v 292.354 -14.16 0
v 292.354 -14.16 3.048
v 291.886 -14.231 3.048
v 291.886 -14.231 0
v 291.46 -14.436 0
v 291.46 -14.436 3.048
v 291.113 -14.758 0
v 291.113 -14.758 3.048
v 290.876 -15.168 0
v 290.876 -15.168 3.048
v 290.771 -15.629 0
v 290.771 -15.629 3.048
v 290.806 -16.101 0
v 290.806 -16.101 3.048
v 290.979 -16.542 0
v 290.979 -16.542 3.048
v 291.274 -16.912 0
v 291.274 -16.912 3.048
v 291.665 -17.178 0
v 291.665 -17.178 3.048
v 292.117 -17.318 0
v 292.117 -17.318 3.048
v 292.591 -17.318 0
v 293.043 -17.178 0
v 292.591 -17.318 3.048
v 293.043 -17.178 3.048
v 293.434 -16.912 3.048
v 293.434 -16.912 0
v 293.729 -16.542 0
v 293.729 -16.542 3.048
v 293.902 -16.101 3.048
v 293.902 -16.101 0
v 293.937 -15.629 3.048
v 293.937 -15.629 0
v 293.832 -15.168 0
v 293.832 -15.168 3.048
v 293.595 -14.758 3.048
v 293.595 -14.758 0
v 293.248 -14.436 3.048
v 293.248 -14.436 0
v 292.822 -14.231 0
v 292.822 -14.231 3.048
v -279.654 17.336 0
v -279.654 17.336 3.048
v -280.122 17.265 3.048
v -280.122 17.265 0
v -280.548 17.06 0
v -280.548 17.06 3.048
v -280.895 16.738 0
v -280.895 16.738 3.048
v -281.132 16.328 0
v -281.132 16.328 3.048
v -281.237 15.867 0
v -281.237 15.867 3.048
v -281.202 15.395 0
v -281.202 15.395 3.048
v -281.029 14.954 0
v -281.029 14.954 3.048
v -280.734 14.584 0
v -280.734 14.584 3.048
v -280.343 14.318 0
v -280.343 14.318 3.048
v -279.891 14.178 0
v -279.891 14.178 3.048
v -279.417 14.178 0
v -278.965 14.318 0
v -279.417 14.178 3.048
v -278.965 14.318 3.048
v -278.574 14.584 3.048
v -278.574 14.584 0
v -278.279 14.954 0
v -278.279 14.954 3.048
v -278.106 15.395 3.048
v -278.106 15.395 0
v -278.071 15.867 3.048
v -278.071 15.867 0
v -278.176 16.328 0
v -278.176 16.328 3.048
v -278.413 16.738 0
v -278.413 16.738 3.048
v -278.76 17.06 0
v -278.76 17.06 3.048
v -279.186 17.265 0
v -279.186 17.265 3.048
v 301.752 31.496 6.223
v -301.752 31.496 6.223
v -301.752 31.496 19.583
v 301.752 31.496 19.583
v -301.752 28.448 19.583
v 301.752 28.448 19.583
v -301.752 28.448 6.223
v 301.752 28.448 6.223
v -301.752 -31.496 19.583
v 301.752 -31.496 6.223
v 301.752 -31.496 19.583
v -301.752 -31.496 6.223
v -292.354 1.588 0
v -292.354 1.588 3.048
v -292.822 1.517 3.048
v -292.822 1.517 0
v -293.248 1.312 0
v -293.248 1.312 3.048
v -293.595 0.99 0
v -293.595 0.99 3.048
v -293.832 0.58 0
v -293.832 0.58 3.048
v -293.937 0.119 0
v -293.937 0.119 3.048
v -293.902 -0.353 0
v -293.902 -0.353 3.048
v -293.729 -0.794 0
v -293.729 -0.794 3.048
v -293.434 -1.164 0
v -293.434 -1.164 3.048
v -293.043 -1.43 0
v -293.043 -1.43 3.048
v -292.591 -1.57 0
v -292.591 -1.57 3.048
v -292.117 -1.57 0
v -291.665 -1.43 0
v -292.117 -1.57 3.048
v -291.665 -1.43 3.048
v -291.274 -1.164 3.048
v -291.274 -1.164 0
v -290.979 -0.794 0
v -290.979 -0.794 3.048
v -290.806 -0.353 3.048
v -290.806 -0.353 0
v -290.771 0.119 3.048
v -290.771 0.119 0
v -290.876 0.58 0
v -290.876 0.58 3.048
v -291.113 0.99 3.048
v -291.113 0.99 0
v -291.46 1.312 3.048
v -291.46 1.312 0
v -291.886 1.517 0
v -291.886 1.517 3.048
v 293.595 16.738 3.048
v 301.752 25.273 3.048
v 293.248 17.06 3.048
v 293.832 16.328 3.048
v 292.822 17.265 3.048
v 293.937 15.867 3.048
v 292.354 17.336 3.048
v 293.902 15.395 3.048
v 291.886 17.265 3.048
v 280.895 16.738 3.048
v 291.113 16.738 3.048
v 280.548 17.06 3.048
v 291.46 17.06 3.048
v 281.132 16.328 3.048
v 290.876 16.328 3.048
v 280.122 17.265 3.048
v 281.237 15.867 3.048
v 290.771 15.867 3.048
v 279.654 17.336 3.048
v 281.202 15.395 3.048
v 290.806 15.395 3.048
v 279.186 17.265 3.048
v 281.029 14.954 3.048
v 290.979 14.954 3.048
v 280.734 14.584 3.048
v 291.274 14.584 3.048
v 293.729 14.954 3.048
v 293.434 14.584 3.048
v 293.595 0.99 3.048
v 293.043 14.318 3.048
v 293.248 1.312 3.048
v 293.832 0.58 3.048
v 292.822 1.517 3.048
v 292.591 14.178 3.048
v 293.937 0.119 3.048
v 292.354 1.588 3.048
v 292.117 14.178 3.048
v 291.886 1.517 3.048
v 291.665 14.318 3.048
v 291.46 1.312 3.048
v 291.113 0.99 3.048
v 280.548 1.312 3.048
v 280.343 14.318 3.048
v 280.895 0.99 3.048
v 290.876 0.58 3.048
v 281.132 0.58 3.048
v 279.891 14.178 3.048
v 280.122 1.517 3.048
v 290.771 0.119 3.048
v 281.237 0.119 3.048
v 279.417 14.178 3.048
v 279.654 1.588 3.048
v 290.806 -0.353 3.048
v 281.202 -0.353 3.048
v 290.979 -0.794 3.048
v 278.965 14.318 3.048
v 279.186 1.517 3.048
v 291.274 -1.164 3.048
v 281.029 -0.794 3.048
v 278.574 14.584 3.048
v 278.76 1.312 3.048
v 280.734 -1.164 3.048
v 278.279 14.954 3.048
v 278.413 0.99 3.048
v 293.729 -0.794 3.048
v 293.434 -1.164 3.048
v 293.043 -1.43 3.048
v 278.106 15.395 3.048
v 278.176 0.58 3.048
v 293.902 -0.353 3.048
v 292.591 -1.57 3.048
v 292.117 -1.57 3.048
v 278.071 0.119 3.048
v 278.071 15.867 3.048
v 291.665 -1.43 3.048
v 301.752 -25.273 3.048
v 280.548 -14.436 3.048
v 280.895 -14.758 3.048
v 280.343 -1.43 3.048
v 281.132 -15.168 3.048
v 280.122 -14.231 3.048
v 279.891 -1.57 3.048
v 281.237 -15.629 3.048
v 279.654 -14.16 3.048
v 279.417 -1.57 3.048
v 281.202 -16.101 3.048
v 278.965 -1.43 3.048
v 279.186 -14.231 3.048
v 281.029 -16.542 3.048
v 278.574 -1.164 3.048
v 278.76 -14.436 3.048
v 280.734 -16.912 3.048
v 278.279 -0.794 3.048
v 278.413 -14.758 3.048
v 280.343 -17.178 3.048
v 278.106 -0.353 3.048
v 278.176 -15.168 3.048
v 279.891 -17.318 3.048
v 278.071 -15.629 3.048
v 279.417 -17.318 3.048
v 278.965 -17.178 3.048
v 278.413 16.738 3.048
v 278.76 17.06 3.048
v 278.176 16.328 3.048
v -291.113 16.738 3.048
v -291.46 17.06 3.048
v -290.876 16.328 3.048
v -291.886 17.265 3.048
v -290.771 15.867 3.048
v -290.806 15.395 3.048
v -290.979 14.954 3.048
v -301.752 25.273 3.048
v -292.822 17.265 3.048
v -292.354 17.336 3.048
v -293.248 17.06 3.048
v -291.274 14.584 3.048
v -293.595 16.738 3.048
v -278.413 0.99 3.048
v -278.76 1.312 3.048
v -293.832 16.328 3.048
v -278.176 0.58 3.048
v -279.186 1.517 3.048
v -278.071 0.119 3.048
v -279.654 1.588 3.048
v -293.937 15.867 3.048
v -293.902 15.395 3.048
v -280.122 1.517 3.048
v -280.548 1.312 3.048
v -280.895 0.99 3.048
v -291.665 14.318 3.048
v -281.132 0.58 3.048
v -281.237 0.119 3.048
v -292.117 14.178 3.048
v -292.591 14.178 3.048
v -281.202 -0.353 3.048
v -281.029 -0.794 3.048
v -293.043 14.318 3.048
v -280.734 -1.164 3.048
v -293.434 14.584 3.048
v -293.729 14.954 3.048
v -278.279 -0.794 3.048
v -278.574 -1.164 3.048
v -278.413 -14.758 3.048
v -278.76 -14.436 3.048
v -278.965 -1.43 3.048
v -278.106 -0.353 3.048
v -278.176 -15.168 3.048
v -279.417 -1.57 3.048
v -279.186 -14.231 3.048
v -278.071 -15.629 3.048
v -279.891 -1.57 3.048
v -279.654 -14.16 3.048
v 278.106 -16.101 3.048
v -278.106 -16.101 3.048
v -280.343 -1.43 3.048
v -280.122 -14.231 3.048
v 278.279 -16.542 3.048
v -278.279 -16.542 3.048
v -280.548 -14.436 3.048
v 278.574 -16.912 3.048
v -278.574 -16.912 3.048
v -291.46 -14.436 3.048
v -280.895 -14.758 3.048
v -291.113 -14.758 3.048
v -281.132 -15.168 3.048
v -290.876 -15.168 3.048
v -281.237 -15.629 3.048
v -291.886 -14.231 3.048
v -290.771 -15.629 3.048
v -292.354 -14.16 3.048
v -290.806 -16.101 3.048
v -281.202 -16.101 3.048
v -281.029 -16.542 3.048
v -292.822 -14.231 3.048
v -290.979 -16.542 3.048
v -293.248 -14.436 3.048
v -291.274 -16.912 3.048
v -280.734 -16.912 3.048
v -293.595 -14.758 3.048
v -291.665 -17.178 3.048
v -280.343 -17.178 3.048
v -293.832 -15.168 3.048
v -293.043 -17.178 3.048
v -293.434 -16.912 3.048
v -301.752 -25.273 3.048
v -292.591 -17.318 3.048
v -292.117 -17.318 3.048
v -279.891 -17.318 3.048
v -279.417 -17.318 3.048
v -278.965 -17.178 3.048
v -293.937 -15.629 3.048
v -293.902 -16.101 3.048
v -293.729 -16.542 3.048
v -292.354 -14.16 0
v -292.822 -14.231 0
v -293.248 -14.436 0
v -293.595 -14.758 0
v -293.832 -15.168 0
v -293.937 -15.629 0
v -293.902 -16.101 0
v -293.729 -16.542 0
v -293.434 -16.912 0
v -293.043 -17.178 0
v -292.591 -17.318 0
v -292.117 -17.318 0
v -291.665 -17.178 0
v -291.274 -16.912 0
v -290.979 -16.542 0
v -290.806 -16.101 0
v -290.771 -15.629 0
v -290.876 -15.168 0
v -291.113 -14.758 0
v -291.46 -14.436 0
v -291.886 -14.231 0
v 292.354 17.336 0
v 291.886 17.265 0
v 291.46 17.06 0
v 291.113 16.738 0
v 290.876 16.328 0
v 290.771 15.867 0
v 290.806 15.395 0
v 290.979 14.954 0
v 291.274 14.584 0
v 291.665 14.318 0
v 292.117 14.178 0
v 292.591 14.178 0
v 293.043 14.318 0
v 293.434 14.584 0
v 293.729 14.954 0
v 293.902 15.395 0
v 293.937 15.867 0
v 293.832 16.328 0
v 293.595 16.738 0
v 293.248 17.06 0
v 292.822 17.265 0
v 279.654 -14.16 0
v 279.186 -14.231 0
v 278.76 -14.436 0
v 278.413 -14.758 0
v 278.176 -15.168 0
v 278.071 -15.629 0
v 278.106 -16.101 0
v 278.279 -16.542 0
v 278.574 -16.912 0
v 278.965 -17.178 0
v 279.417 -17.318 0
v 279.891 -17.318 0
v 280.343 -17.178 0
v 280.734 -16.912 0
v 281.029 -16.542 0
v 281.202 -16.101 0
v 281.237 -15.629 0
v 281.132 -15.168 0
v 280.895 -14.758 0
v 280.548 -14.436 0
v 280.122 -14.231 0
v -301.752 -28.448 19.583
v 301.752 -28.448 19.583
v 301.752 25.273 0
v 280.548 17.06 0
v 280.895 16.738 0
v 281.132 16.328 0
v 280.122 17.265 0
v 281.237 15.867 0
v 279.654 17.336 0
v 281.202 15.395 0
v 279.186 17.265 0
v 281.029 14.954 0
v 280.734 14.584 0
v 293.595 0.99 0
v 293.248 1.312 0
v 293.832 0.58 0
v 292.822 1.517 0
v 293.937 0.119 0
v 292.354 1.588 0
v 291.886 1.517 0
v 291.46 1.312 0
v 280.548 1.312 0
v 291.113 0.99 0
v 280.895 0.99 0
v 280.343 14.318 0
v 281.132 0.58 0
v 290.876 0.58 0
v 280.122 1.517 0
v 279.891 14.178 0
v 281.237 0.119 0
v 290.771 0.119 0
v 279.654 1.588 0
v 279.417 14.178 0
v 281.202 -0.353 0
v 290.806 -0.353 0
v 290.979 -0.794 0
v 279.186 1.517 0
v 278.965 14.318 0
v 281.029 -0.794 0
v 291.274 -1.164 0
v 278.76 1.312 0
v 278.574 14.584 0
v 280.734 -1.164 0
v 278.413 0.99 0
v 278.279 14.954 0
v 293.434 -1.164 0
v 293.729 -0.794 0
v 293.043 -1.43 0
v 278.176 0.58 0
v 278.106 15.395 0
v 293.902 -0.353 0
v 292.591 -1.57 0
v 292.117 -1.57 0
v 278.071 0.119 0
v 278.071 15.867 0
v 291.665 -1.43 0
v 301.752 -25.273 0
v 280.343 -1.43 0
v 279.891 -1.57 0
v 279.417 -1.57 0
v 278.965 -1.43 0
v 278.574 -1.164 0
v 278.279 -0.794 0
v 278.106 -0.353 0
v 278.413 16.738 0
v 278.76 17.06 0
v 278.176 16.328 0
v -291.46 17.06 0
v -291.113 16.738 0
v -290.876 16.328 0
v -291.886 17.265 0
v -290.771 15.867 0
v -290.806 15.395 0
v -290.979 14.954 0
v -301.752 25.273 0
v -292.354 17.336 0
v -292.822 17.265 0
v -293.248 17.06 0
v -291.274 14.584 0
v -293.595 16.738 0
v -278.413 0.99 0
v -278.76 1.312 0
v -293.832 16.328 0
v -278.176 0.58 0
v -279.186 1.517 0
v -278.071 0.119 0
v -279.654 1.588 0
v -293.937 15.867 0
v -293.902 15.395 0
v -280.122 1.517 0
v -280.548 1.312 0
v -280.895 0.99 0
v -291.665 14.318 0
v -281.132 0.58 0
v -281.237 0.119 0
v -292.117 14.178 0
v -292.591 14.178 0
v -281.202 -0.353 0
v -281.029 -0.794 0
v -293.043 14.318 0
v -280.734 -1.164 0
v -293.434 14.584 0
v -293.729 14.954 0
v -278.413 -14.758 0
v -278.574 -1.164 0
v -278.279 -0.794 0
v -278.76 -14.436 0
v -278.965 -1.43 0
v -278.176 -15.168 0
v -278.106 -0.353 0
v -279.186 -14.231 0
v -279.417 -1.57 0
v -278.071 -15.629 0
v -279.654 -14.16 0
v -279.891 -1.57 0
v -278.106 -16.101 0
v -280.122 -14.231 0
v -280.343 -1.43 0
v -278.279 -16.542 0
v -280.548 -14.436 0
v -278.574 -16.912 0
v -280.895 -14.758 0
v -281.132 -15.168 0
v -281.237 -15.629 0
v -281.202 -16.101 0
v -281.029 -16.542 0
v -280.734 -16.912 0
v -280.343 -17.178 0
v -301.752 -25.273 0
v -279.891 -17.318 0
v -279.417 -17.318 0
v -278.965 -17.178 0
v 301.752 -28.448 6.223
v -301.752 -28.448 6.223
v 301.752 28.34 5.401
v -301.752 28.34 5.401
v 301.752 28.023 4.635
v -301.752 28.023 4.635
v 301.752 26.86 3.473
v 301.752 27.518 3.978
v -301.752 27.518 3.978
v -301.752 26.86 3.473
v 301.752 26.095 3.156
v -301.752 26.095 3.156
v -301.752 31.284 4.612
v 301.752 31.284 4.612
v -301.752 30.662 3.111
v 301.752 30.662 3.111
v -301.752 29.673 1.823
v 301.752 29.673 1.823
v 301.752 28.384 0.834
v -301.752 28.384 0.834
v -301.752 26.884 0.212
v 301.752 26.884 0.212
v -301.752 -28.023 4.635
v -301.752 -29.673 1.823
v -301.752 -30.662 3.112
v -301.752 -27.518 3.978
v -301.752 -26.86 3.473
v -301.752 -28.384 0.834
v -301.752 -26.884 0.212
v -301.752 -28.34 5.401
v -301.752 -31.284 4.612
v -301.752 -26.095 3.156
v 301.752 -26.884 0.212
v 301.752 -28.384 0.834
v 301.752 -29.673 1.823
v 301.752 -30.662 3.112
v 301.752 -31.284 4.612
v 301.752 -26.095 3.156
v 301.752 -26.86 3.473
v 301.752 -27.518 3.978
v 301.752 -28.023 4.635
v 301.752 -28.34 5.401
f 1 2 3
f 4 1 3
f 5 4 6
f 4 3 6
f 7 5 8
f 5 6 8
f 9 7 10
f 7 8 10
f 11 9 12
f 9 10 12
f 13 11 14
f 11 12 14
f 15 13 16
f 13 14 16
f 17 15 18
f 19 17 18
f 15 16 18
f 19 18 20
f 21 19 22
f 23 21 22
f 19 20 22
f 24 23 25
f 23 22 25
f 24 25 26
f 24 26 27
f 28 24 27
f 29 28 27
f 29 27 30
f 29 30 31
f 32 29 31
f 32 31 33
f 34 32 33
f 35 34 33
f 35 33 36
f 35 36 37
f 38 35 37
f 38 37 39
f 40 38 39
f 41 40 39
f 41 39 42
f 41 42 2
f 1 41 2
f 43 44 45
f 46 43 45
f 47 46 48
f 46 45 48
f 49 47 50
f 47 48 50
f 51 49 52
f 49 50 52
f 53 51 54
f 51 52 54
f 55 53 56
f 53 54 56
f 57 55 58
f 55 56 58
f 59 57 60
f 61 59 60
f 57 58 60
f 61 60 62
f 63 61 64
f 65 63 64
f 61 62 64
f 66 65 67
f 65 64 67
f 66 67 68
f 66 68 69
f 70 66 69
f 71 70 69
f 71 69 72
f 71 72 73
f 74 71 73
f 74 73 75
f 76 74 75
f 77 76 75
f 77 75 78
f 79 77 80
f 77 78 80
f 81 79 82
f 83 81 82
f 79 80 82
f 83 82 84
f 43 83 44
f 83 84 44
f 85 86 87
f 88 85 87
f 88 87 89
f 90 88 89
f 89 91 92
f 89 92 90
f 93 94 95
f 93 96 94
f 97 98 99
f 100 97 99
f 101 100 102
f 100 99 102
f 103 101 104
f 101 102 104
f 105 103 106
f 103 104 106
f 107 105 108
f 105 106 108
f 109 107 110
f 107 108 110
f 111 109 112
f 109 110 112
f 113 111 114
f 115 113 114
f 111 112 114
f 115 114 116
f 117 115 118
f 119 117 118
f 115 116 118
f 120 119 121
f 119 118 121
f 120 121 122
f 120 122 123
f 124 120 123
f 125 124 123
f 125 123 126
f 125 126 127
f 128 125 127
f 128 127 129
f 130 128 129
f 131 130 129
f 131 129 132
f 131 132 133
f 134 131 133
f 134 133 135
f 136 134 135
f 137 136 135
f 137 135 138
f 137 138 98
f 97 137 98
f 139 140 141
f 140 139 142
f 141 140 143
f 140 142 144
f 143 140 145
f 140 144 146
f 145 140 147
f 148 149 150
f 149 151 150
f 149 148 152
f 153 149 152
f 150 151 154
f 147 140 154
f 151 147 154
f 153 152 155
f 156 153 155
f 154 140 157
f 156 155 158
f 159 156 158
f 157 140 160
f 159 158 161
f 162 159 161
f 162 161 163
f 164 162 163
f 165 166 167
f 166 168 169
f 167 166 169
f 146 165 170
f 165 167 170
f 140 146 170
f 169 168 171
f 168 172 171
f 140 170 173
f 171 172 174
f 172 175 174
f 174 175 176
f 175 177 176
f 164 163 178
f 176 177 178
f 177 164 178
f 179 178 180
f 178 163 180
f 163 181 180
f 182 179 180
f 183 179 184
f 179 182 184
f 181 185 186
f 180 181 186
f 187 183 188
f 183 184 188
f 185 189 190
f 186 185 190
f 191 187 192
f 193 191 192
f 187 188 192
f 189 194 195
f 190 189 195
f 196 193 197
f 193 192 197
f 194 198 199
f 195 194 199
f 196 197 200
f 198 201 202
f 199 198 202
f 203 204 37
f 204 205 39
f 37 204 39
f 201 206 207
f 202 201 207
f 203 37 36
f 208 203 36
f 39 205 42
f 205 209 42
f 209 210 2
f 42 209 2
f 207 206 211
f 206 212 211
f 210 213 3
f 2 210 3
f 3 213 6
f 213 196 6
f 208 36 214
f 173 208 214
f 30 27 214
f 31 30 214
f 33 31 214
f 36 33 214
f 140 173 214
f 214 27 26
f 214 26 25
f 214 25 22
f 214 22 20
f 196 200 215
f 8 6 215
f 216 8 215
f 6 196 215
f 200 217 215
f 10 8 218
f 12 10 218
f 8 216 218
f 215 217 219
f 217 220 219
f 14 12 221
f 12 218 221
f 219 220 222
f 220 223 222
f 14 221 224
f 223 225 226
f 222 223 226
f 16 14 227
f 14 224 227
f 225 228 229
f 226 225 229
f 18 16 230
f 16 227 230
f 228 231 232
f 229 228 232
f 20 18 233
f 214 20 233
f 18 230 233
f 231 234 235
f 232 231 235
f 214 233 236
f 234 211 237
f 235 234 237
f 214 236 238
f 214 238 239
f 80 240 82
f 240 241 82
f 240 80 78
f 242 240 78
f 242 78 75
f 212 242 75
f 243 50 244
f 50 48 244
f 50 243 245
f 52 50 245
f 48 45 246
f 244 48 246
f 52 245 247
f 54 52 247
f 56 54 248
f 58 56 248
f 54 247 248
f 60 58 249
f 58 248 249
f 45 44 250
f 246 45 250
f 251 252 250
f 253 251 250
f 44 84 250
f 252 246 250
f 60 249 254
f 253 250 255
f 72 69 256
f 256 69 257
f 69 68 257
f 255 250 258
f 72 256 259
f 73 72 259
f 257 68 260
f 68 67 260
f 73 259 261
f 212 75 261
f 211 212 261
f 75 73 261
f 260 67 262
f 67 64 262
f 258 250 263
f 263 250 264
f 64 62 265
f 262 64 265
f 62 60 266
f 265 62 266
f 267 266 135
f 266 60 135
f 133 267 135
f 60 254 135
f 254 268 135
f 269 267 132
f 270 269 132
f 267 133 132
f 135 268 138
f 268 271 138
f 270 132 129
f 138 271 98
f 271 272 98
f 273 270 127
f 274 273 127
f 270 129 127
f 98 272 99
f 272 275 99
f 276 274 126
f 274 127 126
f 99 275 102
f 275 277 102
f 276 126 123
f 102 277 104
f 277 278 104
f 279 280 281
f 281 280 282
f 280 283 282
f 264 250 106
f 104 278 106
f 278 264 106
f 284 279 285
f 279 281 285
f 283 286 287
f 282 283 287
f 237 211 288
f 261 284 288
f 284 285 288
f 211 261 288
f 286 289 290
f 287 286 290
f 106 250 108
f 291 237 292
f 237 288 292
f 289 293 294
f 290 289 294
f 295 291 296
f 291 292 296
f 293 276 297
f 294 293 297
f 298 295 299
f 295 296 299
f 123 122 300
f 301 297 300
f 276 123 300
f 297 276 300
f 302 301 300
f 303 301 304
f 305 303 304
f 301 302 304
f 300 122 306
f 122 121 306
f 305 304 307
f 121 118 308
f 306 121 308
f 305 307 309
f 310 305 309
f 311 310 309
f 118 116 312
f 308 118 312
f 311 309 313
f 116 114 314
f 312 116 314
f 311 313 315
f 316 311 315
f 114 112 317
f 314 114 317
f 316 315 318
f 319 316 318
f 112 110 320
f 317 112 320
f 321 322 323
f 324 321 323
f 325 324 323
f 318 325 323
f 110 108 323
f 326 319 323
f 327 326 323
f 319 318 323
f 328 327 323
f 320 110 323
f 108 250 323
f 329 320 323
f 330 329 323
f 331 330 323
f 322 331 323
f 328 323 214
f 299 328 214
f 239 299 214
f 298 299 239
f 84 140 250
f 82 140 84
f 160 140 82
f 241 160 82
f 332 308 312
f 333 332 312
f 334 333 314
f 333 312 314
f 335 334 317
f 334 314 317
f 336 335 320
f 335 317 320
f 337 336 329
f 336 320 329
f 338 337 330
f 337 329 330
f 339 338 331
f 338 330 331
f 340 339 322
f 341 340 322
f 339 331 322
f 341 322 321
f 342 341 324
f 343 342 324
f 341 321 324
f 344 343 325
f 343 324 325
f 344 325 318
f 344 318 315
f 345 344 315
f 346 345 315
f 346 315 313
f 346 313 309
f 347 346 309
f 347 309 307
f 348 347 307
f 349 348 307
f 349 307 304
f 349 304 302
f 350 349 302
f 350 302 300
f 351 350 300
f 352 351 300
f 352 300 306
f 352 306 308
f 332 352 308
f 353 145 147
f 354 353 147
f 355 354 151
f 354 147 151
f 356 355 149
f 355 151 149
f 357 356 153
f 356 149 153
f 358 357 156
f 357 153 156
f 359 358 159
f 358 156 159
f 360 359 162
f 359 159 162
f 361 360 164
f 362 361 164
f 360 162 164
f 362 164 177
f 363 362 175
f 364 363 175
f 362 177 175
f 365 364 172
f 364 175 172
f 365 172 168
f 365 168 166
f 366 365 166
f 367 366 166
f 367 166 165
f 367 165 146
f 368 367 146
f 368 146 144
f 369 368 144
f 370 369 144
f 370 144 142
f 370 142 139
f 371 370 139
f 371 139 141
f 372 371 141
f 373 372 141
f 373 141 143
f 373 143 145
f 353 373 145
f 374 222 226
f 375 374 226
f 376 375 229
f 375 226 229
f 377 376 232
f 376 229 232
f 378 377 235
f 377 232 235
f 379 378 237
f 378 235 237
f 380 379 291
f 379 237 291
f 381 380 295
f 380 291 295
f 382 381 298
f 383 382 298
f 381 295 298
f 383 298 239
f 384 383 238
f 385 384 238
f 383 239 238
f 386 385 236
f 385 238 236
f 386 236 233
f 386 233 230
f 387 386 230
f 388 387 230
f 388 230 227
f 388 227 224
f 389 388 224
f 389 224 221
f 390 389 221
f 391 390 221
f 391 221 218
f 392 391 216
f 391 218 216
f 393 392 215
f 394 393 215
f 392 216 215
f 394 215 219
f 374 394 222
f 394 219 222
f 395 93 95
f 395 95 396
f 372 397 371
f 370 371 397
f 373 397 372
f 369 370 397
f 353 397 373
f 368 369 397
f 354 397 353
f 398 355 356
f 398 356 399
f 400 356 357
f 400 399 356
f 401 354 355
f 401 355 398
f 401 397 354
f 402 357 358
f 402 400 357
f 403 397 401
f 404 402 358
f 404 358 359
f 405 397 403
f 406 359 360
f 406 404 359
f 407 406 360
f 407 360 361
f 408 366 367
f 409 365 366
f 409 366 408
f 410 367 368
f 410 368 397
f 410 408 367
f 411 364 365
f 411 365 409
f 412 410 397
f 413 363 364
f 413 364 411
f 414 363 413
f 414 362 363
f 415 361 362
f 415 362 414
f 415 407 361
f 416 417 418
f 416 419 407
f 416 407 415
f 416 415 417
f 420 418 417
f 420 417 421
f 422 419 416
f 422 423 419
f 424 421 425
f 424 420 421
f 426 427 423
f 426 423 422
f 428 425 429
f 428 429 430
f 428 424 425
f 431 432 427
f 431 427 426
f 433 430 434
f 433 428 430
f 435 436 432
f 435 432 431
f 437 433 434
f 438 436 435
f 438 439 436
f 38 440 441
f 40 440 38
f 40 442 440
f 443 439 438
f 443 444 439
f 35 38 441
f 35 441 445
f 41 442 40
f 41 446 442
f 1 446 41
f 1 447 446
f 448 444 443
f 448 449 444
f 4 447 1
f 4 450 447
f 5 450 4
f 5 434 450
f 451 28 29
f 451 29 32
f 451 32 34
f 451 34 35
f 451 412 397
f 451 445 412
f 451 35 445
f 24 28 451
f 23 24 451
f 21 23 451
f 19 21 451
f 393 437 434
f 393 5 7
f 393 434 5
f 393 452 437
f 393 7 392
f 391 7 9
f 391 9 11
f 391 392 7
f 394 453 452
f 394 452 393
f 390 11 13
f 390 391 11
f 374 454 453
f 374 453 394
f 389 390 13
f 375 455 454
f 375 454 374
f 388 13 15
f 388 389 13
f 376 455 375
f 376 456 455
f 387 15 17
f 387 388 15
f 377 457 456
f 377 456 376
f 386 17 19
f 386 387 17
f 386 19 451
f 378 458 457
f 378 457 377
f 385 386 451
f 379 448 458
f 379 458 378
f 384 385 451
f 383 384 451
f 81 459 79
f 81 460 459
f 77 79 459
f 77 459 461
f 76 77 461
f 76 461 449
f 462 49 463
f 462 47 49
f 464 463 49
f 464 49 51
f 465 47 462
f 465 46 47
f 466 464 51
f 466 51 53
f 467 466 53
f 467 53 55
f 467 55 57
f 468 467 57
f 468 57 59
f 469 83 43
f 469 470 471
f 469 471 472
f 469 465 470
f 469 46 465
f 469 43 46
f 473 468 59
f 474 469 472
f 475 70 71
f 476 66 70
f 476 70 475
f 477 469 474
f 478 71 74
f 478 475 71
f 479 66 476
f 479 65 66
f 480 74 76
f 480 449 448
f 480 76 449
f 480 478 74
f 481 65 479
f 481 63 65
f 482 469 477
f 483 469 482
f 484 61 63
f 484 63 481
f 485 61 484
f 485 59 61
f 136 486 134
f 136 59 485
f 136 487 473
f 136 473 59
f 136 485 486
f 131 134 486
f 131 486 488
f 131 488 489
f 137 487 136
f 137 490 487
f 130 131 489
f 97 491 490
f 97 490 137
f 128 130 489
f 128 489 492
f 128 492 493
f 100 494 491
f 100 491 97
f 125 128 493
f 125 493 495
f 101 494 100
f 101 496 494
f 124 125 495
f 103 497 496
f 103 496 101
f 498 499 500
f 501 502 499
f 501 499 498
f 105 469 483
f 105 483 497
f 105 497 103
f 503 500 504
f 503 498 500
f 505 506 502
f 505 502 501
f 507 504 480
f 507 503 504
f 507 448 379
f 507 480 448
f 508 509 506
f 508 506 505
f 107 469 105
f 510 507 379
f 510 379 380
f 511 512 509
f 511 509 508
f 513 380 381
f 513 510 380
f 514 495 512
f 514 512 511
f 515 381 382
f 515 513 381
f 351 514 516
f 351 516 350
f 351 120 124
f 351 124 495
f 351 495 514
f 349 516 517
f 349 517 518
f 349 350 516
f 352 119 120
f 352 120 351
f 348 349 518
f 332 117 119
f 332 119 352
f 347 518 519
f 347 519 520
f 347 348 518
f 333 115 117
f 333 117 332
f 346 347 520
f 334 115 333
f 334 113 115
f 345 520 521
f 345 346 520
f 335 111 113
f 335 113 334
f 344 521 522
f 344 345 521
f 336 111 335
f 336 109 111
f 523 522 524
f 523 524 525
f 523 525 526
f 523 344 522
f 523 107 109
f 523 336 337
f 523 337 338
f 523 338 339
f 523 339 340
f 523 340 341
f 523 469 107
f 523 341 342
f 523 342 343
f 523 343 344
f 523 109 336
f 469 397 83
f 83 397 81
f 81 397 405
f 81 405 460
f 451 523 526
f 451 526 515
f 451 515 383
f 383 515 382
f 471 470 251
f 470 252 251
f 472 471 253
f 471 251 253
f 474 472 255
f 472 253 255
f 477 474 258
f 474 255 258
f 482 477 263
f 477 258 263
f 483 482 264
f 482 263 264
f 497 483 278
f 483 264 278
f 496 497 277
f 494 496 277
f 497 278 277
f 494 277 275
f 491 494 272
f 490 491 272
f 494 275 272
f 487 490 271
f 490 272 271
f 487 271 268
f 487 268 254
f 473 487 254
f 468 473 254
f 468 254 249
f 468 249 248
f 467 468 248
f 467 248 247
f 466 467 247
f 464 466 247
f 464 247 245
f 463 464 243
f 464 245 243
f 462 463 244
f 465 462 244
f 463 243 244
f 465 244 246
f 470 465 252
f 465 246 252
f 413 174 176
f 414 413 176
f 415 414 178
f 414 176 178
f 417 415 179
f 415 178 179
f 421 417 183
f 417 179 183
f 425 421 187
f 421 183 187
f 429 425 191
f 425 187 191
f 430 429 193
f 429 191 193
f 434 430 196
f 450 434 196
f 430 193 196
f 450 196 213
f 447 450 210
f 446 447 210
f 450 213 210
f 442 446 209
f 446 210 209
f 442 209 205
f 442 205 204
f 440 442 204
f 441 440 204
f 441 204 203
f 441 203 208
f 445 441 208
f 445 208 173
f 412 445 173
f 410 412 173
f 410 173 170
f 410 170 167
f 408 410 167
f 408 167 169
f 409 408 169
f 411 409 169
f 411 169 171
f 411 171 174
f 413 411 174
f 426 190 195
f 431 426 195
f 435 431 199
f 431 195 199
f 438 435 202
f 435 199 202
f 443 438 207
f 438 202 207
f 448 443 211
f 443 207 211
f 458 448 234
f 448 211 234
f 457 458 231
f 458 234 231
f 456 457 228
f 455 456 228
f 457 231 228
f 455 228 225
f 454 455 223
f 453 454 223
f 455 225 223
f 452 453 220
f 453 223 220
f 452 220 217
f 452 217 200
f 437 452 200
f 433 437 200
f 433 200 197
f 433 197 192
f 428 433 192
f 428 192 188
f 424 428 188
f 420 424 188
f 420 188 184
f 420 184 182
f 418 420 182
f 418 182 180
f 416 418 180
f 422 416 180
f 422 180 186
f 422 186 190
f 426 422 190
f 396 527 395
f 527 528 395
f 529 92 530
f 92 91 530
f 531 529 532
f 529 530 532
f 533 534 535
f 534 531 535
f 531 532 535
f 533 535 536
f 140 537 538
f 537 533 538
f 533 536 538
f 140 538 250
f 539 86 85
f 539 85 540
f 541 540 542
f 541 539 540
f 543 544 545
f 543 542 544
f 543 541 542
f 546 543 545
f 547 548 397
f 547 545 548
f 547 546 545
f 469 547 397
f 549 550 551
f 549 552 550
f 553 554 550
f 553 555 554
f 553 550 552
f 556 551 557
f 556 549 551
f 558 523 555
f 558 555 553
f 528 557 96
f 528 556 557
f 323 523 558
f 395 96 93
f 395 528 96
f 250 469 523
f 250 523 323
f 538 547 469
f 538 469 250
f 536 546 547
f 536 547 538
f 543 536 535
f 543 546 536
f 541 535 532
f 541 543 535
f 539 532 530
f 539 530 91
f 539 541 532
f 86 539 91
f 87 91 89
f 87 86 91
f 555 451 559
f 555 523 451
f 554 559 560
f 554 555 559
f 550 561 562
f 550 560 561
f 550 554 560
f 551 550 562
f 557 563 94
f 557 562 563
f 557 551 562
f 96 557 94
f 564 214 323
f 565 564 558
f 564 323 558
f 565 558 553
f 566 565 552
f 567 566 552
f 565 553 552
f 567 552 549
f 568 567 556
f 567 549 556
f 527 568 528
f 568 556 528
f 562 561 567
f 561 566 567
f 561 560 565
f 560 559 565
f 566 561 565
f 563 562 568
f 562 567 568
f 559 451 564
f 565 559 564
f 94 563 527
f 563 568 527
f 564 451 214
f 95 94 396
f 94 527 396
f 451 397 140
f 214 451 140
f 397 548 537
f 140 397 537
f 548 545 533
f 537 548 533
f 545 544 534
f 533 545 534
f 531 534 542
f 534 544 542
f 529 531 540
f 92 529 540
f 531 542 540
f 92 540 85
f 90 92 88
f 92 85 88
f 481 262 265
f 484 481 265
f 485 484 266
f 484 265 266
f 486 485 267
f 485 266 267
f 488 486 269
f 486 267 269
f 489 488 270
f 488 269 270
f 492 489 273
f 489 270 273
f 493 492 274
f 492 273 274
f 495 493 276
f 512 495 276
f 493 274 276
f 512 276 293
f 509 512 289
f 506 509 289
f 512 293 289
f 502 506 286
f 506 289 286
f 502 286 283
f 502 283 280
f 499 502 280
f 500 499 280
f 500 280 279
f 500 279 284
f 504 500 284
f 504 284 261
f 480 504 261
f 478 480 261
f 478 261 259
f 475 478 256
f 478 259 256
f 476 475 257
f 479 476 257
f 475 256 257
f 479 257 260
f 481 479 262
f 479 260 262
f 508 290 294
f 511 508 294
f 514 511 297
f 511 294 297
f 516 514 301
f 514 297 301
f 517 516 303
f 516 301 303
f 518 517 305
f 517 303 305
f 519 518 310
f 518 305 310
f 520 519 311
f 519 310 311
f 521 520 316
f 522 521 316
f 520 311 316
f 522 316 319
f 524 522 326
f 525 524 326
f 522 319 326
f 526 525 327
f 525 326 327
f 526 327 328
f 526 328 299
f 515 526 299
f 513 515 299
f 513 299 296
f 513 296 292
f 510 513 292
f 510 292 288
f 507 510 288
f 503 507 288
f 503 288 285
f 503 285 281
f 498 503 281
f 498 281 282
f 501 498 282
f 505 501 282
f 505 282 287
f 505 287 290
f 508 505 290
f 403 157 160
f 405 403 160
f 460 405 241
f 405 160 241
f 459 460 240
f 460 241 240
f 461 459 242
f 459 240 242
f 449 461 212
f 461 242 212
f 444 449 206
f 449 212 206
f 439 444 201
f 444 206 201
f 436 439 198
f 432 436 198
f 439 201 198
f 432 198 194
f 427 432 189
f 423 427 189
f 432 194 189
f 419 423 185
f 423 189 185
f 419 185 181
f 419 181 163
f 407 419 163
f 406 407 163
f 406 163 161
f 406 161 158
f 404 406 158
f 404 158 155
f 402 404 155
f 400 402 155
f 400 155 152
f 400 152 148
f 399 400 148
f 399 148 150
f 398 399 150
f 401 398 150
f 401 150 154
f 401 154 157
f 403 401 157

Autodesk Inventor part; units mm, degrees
ref_plane "YZ Plane" through (0, 0, 0) normal (1, 0, 0) x (0, 1, 0)
ref_plane "XZ Plane" through (0, 0, 0) normal (0, 1, 0) x (-1, 0, 0)
ref_plane "XY Plane" through (0, 0, 0) normal (0, 0, 1) x (1, 0, 0)
sketch "Sketch2" plane through (0, 0, 0) normal (0, 0, 1) x (1, 0, 0)
  line L0 (-301.752, 25.273) -> (301.752, 25.273)
  line L1 (301.752, 25.273) -> (301.752, -25.273)
  line L2 (301.752, -25.273) -> (-301.752, -25.273)
  line L3 (-301.752, -25.273) -> (-301.752, 25.273)
  point P0 (0, 0)
  dimension "d0" = 301.752
  dimension "d1" = 301.752
  dimension "d2" = 25.273
  dimension "d3" = 25.273
extrude "Plate1" add sketch "Sketch2" along normal blind 3.048
sketch "Sketch3" plane through (301.752, -25.273, 0) normal (1, 0, 0) x (0, 0, -1)
  line L0 (0, 50.546) -> (-3.048, 50.546)
  arc A0 (0, 50.546) -> (-6.223, 56.769) centre (-6.223, 50.546) ccw
  line L1 (-6.223, 50.546) -> (-6.223, 56.769) construction
  line L2 (-6.223, 50.546) -> (0, 50.546) construction
  line L3 (-6.223, 56.769) -> (-19.5834, 56.769)
  point P0 (0, 25.273)
  dimension "d5" = 90
  dimension "d6" = 6.223
  dimension "d7" = 6.223
  dimension "d8" = 13.3604
contour flange "Contour Flange1" sketch "Sketch3" thickness 3.048 bend radius 3.048 curves A0 L3 edges at (0, 25.273, 0) running between points at (-301.752, 25.273, 0) (301.752, 25.273, 0)
bend "Bend1"
corner "Corner1"
sketch "Sketch4" plane through (301.752, -25.273, 3.048) normal (1, 0, 0) x (0, 0, -1)
  line L0 (3.048, 0) -> (0, 0)
  arc A0 (-3.175, -6.223) -> (3.048, 0) centre (-3.175, 0) ccw
  line L1 (-3.175, 0) -> (-3.175, -6.223) construction
  line L2 (-3.175, 0) -> (3.048, 0) construction
  line L3 (-3.175, -6.223) -> (-16.5354, -6.223)
  point P0 (3.048, 25.273)
  dimension "d18" = 90
  dimension "d19" = 6.223
  dimension "d20" = 6.223
  dimension "d21" = 13.3604
contour flange "Contour Flange2" sketch "Sketch4" thickness 3.048 bend radius 3.048 curves L3 A0 edges at (0, -25.273, 0) running between points at (301.752, -25.273, 0) (-301.752, -25.273, 0)
bend "Bend2"
corner "Corner2"
sketch "Sketch5" plane through (0, 0, 0) normal (0, 0, -1) x (-1, 0, 0)
  line L0 (-301.752, 25.273) -> (-301.752, -25.273) projected
  line L1 (-301.752, -25.273) -> (301.752, -25.273) projected
  line L2 (301.752, -25.273) -> (301.752, 25.273) projected
  point P0 (0, 0)
  point P1 (-292.354, -15.748)
  point P2 (279.654, -15.748)
  dimension "d31" = 9.398
  dimension "d32" = 22.098
  dimension "d33" = 9.525
  dimension "d34" = 9.525
hole "Hole1" at (292.354, -15.748, 0) at (-279.654, -15.748, 0) direction (0, 0, 1) diameter 3.175 end through all
sketch "Sketch6" plane through (0, 0, 0) normal (0, 0, -1) x (-1, 0, 0)
  circle A0 centre (-292.354, -15.748) radius 1.5875 projected
  line L0 (301.752, -25.273) -> (301.752, 25.273) projected
  line L1 (-292.354, -15.748) -> (-277.2602, -15.748)
  point P0 (0, 0)
sketch "Sketch7" plane through (0, 0, 0) normal (0, 0, -1) x (-1, 0, 0)
  circle A0 centre (-292.354, -15.748) radius 1.5875 projected
  line L0 (301.752, -25.273) -> (301.752, 25.273) projected
  line L1 (-292.354, -15.748) -> (-292.354, -4.4863)
  point P0 (0, 0)
pattern_linear "Rectangular Pattern1" count 2 spacing 12.7 along (-1, 0, 0) count 3 spacing 15.748 along (0, 1, 0) of "Hole1"
equation "\"d34\" = d33"
equation "\"d40\" = Thickness"
equation "\"d9\" = BendReliefWidth"
equation "\"d10\" = BendReliefDepth"
equation "\"d11\" = MinimumRemnant"
equation "\"d12\" = BendRadius"
equation "\"d13\" = BendRadius"
equation "\"d15\" = CornerReliefSize"
equation "\"d16\" = GapSize"
equation "\"d17\" = JacobiRadiusSize"
equation "\"d22\" = BendReliefWidth"
equation "\"d23\" = BendReliefDepth"
equation "\"d24\" = MinimumRemnant"
equation "\"d25\" = BendRadius"
equation "\"d26\" = BendRadius"
equation "\"d28\" = CornerReliefSize"
equation "\"d29\" = GapSize"
equation "\"d30\" = JacobiRadiusSize"
equation "\"d1\" = d0"
equation "\"d3\" = d2"
equation "\"BendRadius\" = Thickness"
equation "\"BendReliefWidth\" = Thickness"
equation "\"BendReliefDepth\" = 0.5 * Thickness"
equation "\"CornerReliefSize\" = 4 * Thickness"
equation "\"MinimumRemnant\" = 2 * Thickness"
equation "\"TransitionRadius\" = BendRadius"
equation "\"JacobiRadiusSize\" = BendRadius"
equation "\"GapSize\" = Thickness"
equation "\"d4\" = BendRadius"
equation "\"Thickness\" = 3.048"
properties part number "Base Back Bar"
